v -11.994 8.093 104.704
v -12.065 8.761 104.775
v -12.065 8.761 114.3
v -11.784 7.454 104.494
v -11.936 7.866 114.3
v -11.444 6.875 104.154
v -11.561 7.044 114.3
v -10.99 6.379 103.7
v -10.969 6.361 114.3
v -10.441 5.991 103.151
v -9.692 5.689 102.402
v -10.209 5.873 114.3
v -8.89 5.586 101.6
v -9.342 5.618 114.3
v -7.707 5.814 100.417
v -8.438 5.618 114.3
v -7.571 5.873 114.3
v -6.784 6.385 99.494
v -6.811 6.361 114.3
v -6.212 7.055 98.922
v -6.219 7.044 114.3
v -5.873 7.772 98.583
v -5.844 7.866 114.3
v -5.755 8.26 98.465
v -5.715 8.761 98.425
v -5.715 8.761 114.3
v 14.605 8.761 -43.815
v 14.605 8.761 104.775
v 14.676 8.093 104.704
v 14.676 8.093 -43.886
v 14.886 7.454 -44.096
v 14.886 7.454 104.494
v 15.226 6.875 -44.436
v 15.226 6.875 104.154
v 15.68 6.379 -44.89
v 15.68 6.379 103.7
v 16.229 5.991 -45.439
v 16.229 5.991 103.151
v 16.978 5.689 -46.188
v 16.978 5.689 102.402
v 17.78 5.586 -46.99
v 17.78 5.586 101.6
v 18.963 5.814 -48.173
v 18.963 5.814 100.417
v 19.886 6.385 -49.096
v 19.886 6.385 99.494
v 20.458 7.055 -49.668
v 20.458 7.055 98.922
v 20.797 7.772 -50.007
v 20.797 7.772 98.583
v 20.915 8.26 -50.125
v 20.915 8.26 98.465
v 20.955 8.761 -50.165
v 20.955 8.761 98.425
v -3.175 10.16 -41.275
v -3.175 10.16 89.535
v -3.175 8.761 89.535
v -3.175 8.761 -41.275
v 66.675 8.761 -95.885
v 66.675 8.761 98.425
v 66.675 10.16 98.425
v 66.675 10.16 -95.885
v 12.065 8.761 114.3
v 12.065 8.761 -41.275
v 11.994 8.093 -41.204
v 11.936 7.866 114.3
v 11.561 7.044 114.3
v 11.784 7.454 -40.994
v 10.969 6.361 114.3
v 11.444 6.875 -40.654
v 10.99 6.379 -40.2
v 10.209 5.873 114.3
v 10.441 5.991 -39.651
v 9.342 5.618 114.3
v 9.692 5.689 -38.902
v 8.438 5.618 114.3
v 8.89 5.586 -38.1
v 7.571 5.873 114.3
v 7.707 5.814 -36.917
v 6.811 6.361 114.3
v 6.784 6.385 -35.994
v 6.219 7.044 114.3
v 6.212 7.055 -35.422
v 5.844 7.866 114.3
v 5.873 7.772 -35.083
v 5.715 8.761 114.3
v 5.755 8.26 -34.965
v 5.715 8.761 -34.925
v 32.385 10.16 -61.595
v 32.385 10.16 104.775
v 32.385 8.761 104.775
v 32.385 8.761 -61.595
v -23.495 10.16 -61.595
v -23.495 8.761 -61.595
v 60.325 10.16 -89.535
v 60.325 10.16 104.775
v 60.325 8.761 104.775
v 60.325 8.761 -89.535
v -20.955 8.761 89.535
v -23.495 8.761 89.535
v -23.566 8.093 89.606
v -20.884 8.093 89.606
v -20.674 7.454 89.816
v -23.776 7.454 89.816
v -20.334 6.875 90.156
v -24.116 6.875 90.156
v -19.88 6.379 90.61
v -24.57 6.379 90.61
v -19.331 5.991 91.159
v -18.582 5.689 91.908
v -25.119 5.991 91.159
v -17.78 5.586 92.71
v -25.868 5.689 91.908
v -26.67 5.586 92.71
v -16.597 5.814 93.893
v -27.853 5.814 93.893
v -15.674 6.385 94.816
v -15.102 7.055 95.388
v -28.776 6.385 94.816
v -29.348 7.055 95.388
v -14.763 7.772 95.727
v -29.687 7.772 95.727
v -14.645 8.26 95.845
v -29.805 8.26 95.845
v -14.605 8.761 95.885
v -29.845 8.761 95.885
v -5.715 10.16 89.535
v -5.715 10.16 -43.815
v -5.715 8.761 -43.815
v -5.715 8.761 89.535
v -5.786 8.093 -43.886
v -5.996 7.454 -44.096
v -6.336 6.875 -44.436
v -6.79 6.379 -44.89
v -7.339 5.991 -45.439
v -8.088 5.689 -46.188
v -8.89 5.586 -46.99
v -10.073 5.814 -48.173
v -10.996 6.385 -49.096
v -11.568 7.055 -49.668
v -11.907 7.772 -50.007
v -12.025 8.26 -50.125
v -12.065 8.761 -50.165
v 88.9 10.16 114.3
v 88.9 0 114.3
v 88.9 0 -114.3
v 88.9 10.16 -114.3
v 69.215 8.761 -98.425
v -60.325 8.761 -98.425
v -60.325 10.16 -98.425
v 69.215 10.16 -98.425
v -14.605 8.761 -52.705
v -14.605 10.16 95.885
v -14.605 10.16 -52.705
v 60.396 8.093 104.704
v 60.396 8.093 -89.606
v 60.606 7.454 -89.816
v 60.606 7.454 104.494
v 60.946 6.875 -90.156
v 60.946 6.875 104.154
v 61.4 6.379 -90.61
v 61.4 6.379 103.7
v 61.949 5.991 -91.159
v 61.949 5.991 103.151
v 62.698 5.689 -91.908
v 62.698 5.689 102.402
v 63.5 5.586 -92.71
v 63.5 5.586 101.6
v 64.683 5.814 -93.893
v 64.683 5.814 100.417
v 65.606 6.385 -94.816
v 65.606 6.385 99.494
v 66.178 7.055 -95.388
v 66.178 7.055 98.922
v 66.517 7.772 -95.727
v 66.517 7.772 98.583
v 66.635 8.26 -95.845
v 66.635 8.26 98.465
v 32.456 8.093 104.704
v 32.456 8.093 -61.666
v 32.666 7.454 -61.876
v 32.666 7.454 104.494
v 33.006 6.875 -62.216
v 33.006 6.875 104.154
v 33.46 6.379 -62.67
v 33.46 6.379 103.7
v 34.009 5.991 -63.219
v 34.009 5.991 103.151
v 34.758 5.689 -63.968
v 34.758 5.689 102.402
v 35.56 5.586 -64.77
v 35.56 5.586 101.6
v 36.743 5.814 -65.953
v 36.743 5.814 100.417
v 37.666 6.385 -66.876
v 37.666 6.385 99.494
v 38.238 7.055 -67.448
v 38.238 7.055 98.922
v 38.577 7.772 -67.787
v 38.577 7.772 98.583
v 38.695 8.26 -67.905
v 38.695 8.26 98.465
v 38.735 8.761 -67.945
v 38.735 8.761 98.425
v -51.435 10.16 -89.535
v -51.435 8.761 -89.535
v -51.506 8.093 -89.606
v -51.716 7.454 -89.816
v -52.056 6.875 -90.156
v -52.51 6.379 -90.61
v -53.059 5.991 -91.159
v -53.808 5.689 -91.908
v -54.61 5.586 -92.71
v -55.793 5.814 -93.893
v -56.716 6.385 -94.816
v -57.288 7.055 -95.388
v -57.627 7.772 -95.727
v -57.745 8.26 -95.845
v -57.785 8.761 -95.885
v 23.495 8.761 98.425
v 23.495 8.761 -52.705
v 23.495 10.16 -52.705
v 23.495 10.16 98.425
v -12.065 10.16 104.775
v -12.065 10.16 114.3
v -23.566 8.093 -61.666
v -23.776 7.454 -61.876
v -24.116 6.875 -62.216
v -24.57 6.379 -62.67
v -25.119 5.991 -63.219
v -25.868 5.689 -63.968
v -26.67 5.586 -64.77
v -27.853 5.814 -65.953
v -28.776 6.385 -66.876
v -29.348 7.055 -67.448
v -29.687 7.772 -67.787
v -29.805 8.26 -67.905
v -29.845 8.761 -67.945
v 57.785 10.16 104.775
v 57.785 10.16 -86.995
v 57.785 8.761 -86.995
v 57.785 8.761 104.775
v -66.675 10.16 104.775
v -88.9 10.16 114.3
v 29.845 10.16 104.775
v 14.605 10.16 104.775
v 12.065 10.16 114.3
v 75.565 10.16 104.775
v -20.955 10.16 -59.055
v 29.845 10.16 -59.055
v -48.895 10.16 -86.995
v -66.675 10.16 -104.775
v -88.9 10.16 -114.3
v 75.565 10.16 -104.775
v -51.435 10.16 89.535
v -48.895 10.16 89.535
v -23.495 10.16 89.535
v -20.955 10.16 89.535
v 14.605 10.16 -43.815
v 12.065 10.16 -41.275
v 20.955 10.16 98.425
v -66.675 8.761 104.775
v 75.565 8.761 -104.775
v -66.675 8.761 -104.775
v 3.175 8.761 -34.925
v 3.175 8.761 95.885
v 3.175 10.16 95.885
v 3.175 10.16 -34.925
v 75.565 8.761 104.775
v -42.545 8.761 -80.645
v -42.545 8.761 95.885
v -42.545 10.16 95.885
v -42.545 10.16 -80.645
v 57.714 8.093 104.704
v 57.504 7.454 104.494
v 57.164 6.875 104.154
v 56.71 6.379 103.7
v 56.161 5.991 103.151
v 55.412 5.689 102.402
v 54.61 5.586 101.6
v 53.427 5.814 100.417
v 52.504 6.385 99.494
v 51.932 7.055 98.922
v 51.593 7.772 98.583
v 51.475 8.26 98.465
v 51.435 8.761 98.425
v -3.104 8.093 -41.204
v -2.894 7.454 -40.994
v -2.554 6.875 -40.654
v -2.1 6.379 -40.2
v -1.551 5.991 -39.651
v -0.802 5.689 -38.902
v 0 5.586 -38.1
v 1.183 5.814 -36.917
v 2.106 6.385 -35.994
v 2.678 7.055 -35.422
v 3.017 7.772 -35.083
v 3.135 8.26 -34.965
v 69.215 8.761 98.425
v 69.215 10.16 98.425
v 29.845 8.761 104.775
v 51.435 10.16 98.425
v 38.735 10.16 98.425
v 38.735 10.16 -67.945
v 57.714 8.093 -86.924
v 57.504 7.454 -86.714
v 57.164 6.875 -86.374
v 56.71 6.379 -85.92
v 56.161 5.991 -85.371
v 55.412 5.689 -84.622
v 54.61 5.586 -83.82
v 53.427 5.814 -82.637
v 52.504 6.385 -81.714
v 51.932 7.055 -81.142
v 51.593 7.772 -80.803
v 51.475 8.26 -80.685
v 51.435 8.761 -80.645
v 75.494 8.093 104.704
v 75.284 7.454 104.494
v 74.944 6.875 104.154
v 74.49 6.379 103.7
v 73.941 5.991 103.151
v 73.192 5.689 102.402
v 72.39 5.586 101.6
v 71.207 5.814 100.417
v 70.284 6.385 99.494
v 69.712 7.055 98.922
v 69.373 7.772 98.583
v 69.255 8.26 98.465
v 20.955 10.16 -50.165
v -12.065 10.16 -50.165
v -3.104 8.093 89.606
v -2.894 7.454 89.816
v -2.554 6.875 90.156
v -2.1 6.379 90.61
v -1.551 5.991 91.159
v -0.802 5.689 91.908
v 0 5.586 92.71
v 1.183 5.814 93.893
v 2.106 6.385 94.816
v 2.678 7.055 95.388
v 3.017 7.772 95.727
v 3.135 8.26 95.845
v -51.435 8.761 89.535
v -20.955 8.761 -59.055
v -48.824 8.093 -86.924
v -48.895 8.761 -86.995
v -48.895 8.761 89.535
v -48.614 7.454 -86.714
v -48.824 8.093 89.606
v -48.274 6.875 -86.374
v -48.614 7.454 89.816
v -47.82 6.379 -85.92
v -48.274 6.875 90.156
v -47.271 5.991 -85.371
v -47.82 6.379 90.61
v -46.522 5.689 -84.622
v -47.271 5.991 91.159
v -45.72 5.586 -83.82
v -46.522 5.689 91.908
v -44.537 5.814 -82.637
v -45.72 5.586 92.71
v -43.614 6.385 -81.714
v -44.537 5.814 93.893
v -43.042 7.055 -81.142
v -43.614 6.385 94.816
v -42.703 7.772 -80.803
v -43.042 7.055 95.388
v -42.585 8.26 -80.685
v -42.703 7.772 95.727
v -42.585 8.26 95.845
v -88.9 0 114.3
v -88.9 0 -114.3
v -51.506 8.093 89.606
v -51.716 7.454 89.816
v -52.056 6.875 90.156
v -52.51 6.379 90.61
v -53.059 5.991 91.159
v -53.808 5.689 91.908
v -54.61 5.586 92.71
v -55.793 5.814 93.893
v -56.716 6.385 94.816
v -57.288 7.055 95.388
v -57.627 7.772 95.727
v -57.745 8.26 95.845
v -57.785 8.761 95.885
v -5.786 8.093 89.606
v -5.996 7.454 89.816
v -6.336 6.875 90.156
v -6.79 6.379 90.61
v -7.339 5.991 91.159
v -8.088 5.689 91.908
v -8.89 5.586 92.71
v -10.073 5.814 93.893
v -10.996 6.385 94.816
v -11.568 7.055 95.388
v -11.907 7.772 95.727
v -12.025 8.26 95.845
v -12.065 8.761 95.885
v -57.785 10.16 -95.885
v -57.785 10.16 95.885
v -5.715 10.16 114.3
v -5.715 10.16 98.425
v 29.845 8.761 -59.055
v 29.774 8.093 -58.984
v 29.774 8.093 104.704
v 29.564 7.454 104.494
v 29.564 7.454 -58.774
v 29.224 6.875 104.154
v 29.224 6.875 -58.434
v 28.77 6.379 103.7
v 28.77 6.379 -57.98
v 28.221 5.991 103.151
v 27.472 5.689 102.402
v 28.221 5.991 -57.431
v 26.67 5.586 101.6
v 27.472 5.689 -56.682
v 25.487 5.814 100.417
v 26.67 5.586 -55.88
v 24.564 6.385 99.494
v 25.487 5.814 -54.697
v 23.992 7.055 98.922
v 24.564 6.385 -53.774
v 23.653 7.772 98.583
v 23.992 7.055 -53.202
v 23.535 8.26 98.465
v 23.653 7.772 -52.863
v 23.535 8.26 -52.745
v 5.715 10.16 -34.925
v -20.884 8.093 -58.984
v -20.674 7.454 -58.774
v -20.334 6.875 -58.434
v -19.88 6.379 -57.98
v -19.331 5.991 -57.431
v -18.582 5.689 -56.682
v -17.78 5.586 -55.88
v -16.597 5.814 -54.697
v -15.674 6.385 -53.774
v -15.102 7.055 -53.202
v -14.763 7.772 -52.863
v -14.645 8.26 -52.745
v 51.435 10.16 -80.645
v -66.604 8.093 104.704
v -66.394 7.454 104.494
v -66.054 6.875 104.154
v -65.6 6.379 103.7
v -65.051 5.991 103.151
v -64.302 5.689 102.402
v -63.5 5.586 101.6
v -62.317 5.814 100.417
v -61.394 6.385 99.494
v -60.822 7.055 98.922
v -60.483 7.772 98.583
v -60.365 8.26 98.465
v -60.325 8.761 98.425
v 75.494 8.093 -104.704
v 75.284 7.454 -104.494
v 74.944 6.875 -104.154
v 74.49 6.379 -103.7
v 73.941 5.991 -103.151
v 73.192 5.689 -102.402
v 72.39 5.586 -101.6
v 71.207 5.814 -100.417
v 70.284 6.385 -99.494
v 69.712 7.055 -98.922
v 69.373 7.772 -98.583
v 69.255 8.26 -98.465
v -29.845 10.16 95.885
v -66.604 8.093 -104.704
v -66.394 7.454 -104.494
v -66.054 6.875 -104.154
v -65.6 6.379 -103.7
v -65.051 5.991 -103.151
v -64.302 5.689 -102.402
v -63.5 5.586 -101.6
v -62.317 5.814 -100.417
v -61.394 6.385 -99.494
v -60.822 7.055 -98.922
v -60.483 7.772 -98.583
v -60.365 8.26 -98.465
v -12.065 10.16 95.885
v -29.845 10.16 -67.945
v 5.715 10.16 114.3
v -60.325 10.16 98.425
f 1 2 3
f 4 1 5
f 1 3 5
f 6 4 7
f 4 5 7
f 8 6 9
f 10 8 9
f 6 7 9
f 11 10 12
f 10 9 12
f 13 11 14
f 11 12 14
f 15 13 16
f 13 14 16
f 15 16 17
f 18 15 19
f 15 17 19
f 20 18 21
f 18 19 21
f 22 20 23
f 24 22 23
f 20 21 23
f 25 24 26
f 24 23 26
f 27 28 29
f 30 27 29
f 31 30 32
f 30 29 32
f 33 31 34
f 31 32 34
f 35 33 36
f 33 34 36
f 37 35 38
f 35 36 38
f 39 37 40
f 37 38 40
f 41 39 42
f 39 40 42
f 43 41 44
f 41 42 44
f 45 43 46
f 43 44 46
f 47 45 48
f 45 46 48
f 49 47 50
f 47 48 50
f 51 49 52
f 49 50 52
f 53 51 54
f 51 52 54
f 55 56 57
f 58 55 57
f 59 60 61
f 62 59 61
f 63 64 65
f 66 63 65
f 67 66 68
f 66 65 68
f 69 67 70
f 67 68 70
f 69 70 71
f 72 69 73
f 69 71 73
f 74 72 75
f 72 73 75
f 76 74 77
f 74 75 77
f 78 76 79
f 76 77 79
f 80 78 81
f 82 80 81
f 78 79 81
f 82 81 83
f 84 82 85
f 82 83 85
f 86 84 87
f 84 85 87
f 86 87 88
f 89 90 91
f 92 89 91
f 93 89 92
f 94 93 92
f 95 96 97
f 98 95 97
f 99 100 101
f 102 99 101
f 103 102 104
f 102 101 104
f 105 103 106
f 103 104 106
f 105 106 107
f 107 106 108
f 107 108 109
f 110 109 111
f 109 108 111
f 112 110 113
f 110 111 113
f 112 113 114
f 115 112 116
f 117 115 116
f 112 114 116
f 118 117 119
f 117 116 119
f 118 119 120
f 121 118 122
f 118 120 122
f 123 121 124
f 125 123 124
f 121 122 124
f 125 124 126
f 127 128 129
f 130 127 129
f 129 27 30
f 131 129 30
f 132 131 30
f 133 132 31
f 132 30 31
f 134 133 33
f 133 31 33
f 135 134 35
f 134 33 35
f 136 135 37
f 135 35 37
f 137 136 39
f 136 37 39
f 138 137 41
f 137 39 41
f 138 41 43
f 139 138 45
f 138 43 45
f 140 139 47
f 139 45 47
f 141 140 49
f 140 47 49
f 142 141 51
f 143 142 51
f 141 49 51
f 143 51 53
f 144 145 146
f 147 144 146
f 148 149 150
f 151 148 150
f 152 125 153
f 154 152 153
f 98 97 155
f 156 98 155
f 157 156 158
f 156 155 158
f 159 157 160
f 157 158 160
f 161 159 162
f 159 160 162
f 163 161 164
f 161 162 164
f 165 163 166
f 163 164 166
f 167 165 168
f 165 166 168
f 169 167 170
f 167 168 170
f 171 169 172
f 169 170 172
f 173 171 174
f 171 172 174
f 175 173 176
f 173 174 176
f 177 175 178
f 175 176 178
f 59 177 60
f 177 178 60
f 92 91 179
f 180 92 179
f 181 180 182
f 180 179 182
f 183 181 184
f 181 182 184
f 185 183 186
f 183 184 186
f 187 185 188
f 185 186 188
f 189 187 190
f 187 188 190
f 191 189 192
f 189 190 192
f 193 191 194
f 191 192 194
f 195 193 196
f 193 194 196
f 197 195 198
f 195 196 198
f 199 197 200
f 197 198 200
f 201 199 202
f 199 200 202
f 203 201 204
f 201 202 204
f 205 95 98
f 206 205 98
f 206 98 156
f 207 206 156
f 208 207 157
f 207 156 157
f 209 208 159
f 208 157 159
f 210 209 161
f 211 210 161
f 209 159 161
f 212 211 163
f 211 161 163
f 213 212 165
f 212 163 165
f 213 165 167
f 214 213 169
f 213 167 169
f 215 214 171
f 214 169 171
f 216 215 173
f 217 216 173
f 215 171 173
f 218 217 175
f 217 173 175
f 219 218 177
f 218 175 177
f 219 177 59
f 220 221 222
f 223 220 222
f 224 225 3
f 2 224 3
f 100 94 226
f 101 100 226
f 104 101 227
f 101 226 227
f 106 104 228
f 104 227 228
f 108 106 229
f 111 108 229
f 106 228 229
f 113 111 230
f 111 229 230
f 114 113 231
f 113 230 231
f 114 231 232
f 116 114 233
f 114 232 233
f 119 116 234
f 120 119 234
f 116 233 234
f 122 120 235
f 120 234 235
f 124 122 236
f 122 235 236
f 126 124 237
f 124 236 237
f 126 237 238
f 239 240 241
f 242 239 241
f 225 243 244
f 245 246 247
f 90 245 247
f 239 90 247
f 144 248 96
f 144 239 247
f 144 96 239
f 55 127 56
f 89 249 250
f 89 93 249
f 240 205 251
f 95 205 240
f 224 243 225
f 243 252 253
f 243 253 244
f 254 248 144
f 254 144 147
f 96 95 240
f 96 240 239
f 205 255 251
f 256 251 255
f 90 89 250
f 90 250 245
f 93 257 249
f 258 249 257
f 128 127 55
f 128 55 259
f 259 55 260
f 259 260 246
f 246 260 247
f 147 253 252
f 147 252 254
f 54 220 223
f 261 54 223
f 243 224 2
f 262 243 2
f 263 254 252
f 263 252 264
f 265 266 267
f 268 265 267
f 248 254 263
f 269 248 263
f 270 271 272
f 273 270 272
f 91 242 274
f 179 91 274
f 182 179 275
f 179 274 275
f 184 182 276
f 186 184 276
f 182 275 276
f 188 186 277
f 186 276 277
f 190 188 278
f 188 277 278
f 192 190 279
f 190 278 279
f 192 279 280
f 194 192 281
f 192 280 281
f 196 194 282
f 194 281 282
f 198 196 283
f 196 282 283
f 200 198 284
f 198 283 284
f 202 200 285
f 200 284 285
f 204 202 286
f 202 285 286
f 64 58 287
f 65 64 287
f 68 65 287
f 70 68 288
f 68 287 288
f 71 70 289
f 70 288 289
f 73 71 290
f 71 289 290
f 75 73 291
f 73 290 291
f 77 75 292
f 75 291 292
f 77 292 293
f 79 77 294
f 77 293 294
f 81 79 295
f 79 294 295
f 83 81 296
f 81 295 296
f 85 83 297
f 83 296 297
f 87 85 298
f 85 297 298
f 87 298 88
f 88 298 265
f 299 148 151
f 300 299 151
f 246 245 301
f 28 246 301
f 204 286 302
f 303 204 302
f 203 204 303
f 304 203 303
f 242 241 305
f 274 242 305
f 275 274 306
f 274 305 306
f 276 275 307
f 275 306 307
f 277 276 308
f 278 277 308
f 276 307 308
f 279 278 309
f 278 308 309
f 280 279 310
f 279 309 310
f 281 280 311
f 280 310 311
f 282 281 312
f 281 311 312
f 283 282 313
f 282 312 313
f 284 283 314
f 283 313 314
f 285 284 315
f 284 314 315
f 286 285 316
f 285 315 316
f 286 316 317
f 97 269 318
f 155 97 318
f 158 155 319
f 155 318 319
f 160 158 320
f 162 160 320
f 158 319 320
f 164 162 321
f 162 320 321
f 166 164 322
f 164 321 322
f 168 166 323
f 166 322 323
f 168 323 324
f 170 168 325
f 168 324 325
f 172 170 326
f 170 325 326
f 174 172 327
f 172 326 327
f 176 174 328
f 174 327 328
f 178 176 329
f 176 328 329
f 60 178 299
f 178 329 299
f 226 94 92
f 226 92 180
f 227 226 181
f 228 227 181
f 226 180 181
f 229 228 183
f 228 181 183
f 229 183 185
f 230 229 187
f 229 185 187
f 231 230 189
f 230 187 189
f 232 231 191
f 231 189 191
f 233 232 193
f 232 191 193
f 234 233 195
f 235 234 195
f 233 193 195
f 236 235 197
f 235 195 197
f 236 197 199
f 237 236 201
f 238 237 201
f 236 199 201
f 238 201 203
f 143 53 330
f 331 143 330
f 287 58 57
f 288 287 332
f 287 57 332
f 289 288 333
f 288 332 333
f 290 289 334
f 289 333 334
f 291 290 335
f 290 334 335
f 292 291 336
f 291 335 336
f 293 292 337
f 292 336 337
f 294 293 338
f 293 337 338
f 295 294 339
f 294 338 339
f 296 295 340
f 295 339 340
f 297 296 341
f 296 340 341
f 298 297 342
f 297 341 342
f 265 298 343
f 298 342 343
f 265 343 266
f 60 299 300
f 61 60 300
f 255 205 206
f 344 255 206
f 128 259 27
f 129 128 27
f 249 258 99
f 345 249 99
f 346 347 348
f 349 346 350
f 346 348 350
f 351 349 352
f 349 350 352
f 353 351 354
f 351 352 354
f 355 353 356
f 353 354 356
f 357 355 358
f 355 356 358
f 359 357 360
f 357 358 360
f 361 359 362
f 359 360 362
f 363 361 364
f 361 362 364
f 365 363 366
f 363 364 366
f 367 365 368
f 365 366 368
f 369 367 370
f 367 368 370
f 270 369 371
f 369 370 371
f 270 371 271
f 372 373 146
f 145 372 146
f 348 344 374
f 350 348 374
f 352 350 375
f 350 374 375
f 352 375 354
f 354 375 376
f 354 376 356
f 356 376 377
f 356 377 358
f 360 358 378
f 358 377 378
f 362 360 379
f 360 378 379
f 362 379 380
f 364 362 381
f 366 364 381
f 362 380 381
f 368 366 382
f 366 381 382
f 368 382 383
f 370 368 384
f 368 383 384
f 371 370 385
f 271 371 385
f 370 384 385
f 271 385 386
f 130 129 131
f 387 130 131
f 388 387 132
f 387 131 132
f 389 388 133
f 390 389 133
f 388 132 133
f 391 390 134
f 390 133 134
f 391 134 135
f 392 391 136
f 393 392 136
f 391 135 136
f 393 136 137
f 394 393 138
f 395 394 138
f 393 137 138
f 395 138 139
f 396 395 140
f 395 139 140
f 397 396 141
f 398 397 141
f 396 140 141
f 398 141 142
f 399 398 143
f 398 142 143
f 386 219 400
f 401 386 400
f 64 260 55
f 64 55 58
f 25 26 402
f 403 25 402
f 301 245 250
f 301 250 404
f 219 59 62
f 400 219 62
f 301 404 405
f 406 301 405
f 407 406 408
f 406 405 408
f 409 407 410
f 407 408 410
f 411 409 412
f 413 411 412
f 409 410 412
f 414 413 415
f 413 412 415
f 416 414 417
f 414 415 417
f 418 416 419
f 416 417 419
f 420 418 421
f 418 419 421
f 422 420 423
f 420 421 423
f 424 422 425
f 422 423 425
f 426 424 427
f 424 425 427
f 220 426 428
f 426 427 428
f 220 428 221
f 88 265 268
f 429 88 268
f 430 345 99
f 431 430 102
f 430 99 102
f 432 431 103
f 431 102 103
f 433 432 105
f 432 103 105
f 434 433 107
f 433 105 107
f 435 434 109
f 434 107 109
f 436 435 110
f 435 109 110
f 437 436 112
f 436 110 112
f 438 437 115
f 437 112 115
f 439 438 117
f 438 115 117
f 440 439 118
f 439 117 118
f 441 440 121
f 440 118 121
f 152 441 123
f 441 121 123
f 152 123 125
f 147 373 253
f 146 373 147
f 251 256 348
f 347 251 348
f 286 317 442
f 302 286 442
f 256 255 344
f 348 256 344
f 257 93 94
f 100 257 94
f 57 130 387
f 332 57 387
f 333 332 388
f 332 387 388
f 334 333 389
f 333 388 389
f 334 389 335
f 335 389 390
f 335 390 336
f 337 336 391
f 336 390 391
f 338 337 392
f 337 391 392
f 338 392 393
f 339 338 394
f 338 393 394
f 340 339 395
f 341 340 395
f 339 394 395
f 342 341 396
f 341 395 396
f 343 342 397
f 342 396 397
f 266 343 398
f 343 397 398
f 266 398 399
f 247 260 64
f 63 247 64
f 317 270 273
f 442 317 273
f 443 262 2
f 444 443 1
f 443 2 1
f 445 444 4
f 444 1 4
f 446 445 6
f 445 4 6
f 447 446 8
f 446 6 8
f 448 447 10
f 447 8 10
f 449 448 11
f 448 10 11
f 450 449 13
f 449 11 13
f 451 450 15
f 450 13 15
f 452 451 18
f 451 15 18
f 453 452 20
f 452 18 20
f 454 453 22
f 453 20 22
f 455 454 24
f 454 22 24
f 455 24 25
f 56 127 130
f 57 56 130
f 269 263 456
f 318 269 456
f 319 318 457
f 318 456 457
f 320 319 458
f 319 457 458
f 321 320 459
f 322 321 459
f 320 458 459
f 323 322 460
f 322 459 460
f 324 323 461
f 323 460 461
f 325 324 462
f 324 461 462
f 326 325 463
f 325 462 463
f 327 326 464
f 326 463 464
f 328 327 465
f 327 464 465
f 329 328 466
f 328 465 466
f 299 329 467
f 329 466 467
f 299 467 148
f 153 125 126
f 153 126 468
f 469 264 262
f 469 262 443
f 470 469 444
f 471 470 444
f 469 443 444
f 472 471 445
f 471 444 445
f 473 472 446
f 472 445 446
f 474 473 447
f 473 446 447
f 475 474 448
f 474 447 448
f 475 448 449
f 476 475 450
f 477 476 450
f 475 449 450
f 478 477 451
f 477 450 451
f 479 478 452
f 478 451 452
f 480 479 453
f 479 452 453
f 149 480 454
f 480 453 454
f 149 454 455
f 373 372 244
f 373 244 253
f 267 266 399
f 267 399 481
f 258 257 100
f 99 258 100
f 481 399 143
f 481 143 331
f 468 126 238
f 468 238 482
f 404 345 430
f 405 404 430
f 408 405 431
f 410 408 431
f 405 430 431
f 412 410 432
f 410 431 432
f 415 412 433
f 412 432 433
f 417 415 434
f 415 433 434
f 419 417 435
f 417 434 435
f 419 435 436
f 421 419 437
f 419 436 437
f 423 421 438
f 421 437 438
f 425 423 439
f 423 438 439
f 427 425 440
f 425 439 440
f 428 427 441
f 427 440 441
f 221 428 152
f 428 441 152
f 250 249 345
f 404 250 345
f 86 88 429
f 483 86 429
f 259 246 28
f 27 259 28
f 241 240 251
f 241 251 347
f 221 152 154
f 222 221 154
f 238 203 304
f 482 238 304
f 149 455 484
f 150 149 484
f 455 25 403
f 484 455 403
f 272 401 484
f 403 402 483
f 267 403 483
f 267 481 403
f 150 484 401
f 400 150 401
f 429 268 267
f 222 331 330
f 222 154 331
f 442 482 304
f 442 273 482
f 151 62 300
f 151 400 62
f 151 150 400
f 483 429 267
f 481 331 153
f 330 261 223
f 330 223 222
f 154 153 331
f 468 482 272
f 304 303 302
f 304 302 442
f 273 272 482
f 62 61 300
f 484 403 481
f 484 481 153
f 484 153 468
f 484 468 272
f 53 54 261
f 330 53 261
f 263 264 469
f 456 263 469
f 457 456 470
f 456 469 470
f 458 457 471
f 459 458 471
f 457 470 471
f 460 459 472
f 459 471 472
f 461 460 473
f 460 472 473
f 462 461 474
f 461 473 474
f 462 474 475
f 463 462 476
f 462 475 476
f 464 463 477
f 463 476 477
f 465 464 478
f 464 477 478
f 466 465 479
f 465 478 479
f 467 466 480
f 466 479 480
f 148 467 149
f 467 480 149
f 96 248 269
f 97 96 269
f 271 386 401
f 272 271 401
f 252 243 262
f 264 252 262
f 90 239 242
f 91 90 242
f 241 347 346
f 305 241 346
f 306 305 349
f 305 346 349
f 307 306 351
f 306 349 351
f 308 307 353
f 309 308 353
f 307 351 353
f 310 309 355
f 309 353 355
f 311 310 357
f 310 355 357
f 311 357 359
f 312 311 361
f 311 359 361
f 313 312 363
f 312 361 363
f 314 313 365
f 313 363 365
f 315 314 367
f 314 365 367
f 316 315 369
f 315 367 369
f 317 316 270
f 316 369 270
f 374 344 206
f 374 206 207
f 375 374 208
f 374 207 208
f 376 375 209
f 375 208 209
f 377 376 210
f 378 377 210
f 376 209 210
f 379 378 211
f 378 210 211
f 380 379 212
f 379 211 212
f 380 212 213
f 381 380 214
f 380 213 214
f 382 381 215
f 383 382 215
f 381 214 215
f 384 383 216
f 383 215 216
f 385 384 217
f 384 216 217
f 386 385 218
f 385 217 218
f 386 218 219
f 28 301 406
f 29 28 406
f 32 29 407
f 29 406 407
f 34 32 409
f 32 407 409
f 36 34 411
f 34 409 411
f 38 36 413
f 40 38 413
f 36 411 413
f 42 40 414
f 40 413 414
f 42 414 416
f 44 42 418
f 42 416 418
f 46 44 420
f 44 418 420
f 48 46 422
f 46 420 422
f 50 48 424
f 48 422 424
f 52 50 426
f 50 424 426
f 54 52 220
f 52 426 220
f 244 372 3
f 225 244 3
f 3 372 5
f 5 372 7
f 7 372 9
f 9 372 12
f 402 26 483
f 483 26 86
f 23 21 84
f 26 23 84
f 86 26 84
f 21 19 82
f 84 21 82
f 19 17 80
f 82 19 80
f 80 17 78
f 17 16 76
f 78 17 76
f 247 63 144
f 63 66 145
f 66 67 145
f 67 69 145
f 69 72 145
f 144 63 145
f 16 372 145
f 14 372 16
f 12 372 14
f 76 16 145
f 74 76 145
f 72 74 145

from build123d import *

# Parameters (mm, degrees)
SKETCH1_W           = 177.8
SKETCH1_H           = 228.6
BOSS_EXTRUDE1_DEPTH = 10.16


with BuildPart() as part:
    # Sketch1 → Boss-Extrude1 (new body)
    with BuildSketch(Plane(origin=(0, 0, 0), x_dir=(1, 0, 0), z_dir=(0, 1, 0))):
        Rectangle(SKETCH1_W, SKETCH1_H)
    extrude(amount=BOSS_EXTRUDE1_DEPTH)

    # Cut-Sweep2: sweep along a path in Sketch2
    with BuildLine(Plane(origin=(0, 10.16, 0), x_dir=(1, 0, 0), z_dir=(0, 1, 0))) as cut_sweep2_path:
        Line((8.89, -114.3), (8.89, 38.1))
        Line((8.89, 38.1), (0, 38.1))
        Line((0, 38.1), (0, -92.71))
        Line((0, -92.71), (-8.89, -92.71))
        Line((-8.89, -92.71), (-8.89, 46.99))
        Line((-8.89, 46.99), (17.78, 46.99))
        Line((17.78, 46.99), (17.78, -101.6))
        Line((17.78, -101.6), (26.67, -101.6))
        Line((26.67, -101.6), (26.67, 55.88))
        Line((26.67, 55.88), (-17.78, 55.88))
        Line((-17.78, 55.88), (-17.78, -92.71))
        Line((-17.78, -92.71), (-26.67, -92.71))
        Line((-26.67, -92.71), (-26.67, 64.77))
        Line((-26.67, 64.77), (35.56, 64.77))
        Line((35.56, 64.77), (35.56, -101.6))
        Line((35.56, -101.6), (54.61, -101.6))
        Line((54.61, -101.6), (54.61, 83.82))
        Line((54.61, 83.82), (-45.72, 83.82))
        Line((-45.72, 83.82), (-45.72, -92.71))
        Line((-45.72, -92.71), (-54.61, -92.71))
        Line((-54.61, -92.71), (-54.61, 92.71))
        Line((-54.61, 92.71), (63.5, 92.71))
        Line((63.5, 92.71), (63.5, -101.6))
        Line((63.5, -101.6), (72.39, -101.6))
        Line((72.39, -101.6), (72.39, 101.6))
        Line((72.39, 101.6), (-63.5, 101.6))
        Line((-63.5, 101.6), (-63.5, -101.6))
        Line((-63.5, -101.6), (-8.89, -101.6))
        Line((-8.89, -101.6), (-8.89, -114.3))
    # Sketch4 → Cut-Sweep2 (sweep, cut)
    with BuildSketch(Plane.XY.offset(114.3)):
        with BuildLine():
            Line((-5.715, 10.16), (-5.715, 8.760933946))
            ThreePointArc((-5.715, 8.760933946), (-8.89, 5.585933946), (-12.065, 8.760933946))
            Line((-12.065, 8.760933946), (-12.065, 10.16))
            ThreePointArc((-12.065, 10.16), (-8.89, 13.335), (-5.715, 10.16))
        make_face()
    sweep(path=cut_sweep2_path.line, transition=Transition.RIGHT, mode=Mode.SUBTRACT)


solid = part.part
